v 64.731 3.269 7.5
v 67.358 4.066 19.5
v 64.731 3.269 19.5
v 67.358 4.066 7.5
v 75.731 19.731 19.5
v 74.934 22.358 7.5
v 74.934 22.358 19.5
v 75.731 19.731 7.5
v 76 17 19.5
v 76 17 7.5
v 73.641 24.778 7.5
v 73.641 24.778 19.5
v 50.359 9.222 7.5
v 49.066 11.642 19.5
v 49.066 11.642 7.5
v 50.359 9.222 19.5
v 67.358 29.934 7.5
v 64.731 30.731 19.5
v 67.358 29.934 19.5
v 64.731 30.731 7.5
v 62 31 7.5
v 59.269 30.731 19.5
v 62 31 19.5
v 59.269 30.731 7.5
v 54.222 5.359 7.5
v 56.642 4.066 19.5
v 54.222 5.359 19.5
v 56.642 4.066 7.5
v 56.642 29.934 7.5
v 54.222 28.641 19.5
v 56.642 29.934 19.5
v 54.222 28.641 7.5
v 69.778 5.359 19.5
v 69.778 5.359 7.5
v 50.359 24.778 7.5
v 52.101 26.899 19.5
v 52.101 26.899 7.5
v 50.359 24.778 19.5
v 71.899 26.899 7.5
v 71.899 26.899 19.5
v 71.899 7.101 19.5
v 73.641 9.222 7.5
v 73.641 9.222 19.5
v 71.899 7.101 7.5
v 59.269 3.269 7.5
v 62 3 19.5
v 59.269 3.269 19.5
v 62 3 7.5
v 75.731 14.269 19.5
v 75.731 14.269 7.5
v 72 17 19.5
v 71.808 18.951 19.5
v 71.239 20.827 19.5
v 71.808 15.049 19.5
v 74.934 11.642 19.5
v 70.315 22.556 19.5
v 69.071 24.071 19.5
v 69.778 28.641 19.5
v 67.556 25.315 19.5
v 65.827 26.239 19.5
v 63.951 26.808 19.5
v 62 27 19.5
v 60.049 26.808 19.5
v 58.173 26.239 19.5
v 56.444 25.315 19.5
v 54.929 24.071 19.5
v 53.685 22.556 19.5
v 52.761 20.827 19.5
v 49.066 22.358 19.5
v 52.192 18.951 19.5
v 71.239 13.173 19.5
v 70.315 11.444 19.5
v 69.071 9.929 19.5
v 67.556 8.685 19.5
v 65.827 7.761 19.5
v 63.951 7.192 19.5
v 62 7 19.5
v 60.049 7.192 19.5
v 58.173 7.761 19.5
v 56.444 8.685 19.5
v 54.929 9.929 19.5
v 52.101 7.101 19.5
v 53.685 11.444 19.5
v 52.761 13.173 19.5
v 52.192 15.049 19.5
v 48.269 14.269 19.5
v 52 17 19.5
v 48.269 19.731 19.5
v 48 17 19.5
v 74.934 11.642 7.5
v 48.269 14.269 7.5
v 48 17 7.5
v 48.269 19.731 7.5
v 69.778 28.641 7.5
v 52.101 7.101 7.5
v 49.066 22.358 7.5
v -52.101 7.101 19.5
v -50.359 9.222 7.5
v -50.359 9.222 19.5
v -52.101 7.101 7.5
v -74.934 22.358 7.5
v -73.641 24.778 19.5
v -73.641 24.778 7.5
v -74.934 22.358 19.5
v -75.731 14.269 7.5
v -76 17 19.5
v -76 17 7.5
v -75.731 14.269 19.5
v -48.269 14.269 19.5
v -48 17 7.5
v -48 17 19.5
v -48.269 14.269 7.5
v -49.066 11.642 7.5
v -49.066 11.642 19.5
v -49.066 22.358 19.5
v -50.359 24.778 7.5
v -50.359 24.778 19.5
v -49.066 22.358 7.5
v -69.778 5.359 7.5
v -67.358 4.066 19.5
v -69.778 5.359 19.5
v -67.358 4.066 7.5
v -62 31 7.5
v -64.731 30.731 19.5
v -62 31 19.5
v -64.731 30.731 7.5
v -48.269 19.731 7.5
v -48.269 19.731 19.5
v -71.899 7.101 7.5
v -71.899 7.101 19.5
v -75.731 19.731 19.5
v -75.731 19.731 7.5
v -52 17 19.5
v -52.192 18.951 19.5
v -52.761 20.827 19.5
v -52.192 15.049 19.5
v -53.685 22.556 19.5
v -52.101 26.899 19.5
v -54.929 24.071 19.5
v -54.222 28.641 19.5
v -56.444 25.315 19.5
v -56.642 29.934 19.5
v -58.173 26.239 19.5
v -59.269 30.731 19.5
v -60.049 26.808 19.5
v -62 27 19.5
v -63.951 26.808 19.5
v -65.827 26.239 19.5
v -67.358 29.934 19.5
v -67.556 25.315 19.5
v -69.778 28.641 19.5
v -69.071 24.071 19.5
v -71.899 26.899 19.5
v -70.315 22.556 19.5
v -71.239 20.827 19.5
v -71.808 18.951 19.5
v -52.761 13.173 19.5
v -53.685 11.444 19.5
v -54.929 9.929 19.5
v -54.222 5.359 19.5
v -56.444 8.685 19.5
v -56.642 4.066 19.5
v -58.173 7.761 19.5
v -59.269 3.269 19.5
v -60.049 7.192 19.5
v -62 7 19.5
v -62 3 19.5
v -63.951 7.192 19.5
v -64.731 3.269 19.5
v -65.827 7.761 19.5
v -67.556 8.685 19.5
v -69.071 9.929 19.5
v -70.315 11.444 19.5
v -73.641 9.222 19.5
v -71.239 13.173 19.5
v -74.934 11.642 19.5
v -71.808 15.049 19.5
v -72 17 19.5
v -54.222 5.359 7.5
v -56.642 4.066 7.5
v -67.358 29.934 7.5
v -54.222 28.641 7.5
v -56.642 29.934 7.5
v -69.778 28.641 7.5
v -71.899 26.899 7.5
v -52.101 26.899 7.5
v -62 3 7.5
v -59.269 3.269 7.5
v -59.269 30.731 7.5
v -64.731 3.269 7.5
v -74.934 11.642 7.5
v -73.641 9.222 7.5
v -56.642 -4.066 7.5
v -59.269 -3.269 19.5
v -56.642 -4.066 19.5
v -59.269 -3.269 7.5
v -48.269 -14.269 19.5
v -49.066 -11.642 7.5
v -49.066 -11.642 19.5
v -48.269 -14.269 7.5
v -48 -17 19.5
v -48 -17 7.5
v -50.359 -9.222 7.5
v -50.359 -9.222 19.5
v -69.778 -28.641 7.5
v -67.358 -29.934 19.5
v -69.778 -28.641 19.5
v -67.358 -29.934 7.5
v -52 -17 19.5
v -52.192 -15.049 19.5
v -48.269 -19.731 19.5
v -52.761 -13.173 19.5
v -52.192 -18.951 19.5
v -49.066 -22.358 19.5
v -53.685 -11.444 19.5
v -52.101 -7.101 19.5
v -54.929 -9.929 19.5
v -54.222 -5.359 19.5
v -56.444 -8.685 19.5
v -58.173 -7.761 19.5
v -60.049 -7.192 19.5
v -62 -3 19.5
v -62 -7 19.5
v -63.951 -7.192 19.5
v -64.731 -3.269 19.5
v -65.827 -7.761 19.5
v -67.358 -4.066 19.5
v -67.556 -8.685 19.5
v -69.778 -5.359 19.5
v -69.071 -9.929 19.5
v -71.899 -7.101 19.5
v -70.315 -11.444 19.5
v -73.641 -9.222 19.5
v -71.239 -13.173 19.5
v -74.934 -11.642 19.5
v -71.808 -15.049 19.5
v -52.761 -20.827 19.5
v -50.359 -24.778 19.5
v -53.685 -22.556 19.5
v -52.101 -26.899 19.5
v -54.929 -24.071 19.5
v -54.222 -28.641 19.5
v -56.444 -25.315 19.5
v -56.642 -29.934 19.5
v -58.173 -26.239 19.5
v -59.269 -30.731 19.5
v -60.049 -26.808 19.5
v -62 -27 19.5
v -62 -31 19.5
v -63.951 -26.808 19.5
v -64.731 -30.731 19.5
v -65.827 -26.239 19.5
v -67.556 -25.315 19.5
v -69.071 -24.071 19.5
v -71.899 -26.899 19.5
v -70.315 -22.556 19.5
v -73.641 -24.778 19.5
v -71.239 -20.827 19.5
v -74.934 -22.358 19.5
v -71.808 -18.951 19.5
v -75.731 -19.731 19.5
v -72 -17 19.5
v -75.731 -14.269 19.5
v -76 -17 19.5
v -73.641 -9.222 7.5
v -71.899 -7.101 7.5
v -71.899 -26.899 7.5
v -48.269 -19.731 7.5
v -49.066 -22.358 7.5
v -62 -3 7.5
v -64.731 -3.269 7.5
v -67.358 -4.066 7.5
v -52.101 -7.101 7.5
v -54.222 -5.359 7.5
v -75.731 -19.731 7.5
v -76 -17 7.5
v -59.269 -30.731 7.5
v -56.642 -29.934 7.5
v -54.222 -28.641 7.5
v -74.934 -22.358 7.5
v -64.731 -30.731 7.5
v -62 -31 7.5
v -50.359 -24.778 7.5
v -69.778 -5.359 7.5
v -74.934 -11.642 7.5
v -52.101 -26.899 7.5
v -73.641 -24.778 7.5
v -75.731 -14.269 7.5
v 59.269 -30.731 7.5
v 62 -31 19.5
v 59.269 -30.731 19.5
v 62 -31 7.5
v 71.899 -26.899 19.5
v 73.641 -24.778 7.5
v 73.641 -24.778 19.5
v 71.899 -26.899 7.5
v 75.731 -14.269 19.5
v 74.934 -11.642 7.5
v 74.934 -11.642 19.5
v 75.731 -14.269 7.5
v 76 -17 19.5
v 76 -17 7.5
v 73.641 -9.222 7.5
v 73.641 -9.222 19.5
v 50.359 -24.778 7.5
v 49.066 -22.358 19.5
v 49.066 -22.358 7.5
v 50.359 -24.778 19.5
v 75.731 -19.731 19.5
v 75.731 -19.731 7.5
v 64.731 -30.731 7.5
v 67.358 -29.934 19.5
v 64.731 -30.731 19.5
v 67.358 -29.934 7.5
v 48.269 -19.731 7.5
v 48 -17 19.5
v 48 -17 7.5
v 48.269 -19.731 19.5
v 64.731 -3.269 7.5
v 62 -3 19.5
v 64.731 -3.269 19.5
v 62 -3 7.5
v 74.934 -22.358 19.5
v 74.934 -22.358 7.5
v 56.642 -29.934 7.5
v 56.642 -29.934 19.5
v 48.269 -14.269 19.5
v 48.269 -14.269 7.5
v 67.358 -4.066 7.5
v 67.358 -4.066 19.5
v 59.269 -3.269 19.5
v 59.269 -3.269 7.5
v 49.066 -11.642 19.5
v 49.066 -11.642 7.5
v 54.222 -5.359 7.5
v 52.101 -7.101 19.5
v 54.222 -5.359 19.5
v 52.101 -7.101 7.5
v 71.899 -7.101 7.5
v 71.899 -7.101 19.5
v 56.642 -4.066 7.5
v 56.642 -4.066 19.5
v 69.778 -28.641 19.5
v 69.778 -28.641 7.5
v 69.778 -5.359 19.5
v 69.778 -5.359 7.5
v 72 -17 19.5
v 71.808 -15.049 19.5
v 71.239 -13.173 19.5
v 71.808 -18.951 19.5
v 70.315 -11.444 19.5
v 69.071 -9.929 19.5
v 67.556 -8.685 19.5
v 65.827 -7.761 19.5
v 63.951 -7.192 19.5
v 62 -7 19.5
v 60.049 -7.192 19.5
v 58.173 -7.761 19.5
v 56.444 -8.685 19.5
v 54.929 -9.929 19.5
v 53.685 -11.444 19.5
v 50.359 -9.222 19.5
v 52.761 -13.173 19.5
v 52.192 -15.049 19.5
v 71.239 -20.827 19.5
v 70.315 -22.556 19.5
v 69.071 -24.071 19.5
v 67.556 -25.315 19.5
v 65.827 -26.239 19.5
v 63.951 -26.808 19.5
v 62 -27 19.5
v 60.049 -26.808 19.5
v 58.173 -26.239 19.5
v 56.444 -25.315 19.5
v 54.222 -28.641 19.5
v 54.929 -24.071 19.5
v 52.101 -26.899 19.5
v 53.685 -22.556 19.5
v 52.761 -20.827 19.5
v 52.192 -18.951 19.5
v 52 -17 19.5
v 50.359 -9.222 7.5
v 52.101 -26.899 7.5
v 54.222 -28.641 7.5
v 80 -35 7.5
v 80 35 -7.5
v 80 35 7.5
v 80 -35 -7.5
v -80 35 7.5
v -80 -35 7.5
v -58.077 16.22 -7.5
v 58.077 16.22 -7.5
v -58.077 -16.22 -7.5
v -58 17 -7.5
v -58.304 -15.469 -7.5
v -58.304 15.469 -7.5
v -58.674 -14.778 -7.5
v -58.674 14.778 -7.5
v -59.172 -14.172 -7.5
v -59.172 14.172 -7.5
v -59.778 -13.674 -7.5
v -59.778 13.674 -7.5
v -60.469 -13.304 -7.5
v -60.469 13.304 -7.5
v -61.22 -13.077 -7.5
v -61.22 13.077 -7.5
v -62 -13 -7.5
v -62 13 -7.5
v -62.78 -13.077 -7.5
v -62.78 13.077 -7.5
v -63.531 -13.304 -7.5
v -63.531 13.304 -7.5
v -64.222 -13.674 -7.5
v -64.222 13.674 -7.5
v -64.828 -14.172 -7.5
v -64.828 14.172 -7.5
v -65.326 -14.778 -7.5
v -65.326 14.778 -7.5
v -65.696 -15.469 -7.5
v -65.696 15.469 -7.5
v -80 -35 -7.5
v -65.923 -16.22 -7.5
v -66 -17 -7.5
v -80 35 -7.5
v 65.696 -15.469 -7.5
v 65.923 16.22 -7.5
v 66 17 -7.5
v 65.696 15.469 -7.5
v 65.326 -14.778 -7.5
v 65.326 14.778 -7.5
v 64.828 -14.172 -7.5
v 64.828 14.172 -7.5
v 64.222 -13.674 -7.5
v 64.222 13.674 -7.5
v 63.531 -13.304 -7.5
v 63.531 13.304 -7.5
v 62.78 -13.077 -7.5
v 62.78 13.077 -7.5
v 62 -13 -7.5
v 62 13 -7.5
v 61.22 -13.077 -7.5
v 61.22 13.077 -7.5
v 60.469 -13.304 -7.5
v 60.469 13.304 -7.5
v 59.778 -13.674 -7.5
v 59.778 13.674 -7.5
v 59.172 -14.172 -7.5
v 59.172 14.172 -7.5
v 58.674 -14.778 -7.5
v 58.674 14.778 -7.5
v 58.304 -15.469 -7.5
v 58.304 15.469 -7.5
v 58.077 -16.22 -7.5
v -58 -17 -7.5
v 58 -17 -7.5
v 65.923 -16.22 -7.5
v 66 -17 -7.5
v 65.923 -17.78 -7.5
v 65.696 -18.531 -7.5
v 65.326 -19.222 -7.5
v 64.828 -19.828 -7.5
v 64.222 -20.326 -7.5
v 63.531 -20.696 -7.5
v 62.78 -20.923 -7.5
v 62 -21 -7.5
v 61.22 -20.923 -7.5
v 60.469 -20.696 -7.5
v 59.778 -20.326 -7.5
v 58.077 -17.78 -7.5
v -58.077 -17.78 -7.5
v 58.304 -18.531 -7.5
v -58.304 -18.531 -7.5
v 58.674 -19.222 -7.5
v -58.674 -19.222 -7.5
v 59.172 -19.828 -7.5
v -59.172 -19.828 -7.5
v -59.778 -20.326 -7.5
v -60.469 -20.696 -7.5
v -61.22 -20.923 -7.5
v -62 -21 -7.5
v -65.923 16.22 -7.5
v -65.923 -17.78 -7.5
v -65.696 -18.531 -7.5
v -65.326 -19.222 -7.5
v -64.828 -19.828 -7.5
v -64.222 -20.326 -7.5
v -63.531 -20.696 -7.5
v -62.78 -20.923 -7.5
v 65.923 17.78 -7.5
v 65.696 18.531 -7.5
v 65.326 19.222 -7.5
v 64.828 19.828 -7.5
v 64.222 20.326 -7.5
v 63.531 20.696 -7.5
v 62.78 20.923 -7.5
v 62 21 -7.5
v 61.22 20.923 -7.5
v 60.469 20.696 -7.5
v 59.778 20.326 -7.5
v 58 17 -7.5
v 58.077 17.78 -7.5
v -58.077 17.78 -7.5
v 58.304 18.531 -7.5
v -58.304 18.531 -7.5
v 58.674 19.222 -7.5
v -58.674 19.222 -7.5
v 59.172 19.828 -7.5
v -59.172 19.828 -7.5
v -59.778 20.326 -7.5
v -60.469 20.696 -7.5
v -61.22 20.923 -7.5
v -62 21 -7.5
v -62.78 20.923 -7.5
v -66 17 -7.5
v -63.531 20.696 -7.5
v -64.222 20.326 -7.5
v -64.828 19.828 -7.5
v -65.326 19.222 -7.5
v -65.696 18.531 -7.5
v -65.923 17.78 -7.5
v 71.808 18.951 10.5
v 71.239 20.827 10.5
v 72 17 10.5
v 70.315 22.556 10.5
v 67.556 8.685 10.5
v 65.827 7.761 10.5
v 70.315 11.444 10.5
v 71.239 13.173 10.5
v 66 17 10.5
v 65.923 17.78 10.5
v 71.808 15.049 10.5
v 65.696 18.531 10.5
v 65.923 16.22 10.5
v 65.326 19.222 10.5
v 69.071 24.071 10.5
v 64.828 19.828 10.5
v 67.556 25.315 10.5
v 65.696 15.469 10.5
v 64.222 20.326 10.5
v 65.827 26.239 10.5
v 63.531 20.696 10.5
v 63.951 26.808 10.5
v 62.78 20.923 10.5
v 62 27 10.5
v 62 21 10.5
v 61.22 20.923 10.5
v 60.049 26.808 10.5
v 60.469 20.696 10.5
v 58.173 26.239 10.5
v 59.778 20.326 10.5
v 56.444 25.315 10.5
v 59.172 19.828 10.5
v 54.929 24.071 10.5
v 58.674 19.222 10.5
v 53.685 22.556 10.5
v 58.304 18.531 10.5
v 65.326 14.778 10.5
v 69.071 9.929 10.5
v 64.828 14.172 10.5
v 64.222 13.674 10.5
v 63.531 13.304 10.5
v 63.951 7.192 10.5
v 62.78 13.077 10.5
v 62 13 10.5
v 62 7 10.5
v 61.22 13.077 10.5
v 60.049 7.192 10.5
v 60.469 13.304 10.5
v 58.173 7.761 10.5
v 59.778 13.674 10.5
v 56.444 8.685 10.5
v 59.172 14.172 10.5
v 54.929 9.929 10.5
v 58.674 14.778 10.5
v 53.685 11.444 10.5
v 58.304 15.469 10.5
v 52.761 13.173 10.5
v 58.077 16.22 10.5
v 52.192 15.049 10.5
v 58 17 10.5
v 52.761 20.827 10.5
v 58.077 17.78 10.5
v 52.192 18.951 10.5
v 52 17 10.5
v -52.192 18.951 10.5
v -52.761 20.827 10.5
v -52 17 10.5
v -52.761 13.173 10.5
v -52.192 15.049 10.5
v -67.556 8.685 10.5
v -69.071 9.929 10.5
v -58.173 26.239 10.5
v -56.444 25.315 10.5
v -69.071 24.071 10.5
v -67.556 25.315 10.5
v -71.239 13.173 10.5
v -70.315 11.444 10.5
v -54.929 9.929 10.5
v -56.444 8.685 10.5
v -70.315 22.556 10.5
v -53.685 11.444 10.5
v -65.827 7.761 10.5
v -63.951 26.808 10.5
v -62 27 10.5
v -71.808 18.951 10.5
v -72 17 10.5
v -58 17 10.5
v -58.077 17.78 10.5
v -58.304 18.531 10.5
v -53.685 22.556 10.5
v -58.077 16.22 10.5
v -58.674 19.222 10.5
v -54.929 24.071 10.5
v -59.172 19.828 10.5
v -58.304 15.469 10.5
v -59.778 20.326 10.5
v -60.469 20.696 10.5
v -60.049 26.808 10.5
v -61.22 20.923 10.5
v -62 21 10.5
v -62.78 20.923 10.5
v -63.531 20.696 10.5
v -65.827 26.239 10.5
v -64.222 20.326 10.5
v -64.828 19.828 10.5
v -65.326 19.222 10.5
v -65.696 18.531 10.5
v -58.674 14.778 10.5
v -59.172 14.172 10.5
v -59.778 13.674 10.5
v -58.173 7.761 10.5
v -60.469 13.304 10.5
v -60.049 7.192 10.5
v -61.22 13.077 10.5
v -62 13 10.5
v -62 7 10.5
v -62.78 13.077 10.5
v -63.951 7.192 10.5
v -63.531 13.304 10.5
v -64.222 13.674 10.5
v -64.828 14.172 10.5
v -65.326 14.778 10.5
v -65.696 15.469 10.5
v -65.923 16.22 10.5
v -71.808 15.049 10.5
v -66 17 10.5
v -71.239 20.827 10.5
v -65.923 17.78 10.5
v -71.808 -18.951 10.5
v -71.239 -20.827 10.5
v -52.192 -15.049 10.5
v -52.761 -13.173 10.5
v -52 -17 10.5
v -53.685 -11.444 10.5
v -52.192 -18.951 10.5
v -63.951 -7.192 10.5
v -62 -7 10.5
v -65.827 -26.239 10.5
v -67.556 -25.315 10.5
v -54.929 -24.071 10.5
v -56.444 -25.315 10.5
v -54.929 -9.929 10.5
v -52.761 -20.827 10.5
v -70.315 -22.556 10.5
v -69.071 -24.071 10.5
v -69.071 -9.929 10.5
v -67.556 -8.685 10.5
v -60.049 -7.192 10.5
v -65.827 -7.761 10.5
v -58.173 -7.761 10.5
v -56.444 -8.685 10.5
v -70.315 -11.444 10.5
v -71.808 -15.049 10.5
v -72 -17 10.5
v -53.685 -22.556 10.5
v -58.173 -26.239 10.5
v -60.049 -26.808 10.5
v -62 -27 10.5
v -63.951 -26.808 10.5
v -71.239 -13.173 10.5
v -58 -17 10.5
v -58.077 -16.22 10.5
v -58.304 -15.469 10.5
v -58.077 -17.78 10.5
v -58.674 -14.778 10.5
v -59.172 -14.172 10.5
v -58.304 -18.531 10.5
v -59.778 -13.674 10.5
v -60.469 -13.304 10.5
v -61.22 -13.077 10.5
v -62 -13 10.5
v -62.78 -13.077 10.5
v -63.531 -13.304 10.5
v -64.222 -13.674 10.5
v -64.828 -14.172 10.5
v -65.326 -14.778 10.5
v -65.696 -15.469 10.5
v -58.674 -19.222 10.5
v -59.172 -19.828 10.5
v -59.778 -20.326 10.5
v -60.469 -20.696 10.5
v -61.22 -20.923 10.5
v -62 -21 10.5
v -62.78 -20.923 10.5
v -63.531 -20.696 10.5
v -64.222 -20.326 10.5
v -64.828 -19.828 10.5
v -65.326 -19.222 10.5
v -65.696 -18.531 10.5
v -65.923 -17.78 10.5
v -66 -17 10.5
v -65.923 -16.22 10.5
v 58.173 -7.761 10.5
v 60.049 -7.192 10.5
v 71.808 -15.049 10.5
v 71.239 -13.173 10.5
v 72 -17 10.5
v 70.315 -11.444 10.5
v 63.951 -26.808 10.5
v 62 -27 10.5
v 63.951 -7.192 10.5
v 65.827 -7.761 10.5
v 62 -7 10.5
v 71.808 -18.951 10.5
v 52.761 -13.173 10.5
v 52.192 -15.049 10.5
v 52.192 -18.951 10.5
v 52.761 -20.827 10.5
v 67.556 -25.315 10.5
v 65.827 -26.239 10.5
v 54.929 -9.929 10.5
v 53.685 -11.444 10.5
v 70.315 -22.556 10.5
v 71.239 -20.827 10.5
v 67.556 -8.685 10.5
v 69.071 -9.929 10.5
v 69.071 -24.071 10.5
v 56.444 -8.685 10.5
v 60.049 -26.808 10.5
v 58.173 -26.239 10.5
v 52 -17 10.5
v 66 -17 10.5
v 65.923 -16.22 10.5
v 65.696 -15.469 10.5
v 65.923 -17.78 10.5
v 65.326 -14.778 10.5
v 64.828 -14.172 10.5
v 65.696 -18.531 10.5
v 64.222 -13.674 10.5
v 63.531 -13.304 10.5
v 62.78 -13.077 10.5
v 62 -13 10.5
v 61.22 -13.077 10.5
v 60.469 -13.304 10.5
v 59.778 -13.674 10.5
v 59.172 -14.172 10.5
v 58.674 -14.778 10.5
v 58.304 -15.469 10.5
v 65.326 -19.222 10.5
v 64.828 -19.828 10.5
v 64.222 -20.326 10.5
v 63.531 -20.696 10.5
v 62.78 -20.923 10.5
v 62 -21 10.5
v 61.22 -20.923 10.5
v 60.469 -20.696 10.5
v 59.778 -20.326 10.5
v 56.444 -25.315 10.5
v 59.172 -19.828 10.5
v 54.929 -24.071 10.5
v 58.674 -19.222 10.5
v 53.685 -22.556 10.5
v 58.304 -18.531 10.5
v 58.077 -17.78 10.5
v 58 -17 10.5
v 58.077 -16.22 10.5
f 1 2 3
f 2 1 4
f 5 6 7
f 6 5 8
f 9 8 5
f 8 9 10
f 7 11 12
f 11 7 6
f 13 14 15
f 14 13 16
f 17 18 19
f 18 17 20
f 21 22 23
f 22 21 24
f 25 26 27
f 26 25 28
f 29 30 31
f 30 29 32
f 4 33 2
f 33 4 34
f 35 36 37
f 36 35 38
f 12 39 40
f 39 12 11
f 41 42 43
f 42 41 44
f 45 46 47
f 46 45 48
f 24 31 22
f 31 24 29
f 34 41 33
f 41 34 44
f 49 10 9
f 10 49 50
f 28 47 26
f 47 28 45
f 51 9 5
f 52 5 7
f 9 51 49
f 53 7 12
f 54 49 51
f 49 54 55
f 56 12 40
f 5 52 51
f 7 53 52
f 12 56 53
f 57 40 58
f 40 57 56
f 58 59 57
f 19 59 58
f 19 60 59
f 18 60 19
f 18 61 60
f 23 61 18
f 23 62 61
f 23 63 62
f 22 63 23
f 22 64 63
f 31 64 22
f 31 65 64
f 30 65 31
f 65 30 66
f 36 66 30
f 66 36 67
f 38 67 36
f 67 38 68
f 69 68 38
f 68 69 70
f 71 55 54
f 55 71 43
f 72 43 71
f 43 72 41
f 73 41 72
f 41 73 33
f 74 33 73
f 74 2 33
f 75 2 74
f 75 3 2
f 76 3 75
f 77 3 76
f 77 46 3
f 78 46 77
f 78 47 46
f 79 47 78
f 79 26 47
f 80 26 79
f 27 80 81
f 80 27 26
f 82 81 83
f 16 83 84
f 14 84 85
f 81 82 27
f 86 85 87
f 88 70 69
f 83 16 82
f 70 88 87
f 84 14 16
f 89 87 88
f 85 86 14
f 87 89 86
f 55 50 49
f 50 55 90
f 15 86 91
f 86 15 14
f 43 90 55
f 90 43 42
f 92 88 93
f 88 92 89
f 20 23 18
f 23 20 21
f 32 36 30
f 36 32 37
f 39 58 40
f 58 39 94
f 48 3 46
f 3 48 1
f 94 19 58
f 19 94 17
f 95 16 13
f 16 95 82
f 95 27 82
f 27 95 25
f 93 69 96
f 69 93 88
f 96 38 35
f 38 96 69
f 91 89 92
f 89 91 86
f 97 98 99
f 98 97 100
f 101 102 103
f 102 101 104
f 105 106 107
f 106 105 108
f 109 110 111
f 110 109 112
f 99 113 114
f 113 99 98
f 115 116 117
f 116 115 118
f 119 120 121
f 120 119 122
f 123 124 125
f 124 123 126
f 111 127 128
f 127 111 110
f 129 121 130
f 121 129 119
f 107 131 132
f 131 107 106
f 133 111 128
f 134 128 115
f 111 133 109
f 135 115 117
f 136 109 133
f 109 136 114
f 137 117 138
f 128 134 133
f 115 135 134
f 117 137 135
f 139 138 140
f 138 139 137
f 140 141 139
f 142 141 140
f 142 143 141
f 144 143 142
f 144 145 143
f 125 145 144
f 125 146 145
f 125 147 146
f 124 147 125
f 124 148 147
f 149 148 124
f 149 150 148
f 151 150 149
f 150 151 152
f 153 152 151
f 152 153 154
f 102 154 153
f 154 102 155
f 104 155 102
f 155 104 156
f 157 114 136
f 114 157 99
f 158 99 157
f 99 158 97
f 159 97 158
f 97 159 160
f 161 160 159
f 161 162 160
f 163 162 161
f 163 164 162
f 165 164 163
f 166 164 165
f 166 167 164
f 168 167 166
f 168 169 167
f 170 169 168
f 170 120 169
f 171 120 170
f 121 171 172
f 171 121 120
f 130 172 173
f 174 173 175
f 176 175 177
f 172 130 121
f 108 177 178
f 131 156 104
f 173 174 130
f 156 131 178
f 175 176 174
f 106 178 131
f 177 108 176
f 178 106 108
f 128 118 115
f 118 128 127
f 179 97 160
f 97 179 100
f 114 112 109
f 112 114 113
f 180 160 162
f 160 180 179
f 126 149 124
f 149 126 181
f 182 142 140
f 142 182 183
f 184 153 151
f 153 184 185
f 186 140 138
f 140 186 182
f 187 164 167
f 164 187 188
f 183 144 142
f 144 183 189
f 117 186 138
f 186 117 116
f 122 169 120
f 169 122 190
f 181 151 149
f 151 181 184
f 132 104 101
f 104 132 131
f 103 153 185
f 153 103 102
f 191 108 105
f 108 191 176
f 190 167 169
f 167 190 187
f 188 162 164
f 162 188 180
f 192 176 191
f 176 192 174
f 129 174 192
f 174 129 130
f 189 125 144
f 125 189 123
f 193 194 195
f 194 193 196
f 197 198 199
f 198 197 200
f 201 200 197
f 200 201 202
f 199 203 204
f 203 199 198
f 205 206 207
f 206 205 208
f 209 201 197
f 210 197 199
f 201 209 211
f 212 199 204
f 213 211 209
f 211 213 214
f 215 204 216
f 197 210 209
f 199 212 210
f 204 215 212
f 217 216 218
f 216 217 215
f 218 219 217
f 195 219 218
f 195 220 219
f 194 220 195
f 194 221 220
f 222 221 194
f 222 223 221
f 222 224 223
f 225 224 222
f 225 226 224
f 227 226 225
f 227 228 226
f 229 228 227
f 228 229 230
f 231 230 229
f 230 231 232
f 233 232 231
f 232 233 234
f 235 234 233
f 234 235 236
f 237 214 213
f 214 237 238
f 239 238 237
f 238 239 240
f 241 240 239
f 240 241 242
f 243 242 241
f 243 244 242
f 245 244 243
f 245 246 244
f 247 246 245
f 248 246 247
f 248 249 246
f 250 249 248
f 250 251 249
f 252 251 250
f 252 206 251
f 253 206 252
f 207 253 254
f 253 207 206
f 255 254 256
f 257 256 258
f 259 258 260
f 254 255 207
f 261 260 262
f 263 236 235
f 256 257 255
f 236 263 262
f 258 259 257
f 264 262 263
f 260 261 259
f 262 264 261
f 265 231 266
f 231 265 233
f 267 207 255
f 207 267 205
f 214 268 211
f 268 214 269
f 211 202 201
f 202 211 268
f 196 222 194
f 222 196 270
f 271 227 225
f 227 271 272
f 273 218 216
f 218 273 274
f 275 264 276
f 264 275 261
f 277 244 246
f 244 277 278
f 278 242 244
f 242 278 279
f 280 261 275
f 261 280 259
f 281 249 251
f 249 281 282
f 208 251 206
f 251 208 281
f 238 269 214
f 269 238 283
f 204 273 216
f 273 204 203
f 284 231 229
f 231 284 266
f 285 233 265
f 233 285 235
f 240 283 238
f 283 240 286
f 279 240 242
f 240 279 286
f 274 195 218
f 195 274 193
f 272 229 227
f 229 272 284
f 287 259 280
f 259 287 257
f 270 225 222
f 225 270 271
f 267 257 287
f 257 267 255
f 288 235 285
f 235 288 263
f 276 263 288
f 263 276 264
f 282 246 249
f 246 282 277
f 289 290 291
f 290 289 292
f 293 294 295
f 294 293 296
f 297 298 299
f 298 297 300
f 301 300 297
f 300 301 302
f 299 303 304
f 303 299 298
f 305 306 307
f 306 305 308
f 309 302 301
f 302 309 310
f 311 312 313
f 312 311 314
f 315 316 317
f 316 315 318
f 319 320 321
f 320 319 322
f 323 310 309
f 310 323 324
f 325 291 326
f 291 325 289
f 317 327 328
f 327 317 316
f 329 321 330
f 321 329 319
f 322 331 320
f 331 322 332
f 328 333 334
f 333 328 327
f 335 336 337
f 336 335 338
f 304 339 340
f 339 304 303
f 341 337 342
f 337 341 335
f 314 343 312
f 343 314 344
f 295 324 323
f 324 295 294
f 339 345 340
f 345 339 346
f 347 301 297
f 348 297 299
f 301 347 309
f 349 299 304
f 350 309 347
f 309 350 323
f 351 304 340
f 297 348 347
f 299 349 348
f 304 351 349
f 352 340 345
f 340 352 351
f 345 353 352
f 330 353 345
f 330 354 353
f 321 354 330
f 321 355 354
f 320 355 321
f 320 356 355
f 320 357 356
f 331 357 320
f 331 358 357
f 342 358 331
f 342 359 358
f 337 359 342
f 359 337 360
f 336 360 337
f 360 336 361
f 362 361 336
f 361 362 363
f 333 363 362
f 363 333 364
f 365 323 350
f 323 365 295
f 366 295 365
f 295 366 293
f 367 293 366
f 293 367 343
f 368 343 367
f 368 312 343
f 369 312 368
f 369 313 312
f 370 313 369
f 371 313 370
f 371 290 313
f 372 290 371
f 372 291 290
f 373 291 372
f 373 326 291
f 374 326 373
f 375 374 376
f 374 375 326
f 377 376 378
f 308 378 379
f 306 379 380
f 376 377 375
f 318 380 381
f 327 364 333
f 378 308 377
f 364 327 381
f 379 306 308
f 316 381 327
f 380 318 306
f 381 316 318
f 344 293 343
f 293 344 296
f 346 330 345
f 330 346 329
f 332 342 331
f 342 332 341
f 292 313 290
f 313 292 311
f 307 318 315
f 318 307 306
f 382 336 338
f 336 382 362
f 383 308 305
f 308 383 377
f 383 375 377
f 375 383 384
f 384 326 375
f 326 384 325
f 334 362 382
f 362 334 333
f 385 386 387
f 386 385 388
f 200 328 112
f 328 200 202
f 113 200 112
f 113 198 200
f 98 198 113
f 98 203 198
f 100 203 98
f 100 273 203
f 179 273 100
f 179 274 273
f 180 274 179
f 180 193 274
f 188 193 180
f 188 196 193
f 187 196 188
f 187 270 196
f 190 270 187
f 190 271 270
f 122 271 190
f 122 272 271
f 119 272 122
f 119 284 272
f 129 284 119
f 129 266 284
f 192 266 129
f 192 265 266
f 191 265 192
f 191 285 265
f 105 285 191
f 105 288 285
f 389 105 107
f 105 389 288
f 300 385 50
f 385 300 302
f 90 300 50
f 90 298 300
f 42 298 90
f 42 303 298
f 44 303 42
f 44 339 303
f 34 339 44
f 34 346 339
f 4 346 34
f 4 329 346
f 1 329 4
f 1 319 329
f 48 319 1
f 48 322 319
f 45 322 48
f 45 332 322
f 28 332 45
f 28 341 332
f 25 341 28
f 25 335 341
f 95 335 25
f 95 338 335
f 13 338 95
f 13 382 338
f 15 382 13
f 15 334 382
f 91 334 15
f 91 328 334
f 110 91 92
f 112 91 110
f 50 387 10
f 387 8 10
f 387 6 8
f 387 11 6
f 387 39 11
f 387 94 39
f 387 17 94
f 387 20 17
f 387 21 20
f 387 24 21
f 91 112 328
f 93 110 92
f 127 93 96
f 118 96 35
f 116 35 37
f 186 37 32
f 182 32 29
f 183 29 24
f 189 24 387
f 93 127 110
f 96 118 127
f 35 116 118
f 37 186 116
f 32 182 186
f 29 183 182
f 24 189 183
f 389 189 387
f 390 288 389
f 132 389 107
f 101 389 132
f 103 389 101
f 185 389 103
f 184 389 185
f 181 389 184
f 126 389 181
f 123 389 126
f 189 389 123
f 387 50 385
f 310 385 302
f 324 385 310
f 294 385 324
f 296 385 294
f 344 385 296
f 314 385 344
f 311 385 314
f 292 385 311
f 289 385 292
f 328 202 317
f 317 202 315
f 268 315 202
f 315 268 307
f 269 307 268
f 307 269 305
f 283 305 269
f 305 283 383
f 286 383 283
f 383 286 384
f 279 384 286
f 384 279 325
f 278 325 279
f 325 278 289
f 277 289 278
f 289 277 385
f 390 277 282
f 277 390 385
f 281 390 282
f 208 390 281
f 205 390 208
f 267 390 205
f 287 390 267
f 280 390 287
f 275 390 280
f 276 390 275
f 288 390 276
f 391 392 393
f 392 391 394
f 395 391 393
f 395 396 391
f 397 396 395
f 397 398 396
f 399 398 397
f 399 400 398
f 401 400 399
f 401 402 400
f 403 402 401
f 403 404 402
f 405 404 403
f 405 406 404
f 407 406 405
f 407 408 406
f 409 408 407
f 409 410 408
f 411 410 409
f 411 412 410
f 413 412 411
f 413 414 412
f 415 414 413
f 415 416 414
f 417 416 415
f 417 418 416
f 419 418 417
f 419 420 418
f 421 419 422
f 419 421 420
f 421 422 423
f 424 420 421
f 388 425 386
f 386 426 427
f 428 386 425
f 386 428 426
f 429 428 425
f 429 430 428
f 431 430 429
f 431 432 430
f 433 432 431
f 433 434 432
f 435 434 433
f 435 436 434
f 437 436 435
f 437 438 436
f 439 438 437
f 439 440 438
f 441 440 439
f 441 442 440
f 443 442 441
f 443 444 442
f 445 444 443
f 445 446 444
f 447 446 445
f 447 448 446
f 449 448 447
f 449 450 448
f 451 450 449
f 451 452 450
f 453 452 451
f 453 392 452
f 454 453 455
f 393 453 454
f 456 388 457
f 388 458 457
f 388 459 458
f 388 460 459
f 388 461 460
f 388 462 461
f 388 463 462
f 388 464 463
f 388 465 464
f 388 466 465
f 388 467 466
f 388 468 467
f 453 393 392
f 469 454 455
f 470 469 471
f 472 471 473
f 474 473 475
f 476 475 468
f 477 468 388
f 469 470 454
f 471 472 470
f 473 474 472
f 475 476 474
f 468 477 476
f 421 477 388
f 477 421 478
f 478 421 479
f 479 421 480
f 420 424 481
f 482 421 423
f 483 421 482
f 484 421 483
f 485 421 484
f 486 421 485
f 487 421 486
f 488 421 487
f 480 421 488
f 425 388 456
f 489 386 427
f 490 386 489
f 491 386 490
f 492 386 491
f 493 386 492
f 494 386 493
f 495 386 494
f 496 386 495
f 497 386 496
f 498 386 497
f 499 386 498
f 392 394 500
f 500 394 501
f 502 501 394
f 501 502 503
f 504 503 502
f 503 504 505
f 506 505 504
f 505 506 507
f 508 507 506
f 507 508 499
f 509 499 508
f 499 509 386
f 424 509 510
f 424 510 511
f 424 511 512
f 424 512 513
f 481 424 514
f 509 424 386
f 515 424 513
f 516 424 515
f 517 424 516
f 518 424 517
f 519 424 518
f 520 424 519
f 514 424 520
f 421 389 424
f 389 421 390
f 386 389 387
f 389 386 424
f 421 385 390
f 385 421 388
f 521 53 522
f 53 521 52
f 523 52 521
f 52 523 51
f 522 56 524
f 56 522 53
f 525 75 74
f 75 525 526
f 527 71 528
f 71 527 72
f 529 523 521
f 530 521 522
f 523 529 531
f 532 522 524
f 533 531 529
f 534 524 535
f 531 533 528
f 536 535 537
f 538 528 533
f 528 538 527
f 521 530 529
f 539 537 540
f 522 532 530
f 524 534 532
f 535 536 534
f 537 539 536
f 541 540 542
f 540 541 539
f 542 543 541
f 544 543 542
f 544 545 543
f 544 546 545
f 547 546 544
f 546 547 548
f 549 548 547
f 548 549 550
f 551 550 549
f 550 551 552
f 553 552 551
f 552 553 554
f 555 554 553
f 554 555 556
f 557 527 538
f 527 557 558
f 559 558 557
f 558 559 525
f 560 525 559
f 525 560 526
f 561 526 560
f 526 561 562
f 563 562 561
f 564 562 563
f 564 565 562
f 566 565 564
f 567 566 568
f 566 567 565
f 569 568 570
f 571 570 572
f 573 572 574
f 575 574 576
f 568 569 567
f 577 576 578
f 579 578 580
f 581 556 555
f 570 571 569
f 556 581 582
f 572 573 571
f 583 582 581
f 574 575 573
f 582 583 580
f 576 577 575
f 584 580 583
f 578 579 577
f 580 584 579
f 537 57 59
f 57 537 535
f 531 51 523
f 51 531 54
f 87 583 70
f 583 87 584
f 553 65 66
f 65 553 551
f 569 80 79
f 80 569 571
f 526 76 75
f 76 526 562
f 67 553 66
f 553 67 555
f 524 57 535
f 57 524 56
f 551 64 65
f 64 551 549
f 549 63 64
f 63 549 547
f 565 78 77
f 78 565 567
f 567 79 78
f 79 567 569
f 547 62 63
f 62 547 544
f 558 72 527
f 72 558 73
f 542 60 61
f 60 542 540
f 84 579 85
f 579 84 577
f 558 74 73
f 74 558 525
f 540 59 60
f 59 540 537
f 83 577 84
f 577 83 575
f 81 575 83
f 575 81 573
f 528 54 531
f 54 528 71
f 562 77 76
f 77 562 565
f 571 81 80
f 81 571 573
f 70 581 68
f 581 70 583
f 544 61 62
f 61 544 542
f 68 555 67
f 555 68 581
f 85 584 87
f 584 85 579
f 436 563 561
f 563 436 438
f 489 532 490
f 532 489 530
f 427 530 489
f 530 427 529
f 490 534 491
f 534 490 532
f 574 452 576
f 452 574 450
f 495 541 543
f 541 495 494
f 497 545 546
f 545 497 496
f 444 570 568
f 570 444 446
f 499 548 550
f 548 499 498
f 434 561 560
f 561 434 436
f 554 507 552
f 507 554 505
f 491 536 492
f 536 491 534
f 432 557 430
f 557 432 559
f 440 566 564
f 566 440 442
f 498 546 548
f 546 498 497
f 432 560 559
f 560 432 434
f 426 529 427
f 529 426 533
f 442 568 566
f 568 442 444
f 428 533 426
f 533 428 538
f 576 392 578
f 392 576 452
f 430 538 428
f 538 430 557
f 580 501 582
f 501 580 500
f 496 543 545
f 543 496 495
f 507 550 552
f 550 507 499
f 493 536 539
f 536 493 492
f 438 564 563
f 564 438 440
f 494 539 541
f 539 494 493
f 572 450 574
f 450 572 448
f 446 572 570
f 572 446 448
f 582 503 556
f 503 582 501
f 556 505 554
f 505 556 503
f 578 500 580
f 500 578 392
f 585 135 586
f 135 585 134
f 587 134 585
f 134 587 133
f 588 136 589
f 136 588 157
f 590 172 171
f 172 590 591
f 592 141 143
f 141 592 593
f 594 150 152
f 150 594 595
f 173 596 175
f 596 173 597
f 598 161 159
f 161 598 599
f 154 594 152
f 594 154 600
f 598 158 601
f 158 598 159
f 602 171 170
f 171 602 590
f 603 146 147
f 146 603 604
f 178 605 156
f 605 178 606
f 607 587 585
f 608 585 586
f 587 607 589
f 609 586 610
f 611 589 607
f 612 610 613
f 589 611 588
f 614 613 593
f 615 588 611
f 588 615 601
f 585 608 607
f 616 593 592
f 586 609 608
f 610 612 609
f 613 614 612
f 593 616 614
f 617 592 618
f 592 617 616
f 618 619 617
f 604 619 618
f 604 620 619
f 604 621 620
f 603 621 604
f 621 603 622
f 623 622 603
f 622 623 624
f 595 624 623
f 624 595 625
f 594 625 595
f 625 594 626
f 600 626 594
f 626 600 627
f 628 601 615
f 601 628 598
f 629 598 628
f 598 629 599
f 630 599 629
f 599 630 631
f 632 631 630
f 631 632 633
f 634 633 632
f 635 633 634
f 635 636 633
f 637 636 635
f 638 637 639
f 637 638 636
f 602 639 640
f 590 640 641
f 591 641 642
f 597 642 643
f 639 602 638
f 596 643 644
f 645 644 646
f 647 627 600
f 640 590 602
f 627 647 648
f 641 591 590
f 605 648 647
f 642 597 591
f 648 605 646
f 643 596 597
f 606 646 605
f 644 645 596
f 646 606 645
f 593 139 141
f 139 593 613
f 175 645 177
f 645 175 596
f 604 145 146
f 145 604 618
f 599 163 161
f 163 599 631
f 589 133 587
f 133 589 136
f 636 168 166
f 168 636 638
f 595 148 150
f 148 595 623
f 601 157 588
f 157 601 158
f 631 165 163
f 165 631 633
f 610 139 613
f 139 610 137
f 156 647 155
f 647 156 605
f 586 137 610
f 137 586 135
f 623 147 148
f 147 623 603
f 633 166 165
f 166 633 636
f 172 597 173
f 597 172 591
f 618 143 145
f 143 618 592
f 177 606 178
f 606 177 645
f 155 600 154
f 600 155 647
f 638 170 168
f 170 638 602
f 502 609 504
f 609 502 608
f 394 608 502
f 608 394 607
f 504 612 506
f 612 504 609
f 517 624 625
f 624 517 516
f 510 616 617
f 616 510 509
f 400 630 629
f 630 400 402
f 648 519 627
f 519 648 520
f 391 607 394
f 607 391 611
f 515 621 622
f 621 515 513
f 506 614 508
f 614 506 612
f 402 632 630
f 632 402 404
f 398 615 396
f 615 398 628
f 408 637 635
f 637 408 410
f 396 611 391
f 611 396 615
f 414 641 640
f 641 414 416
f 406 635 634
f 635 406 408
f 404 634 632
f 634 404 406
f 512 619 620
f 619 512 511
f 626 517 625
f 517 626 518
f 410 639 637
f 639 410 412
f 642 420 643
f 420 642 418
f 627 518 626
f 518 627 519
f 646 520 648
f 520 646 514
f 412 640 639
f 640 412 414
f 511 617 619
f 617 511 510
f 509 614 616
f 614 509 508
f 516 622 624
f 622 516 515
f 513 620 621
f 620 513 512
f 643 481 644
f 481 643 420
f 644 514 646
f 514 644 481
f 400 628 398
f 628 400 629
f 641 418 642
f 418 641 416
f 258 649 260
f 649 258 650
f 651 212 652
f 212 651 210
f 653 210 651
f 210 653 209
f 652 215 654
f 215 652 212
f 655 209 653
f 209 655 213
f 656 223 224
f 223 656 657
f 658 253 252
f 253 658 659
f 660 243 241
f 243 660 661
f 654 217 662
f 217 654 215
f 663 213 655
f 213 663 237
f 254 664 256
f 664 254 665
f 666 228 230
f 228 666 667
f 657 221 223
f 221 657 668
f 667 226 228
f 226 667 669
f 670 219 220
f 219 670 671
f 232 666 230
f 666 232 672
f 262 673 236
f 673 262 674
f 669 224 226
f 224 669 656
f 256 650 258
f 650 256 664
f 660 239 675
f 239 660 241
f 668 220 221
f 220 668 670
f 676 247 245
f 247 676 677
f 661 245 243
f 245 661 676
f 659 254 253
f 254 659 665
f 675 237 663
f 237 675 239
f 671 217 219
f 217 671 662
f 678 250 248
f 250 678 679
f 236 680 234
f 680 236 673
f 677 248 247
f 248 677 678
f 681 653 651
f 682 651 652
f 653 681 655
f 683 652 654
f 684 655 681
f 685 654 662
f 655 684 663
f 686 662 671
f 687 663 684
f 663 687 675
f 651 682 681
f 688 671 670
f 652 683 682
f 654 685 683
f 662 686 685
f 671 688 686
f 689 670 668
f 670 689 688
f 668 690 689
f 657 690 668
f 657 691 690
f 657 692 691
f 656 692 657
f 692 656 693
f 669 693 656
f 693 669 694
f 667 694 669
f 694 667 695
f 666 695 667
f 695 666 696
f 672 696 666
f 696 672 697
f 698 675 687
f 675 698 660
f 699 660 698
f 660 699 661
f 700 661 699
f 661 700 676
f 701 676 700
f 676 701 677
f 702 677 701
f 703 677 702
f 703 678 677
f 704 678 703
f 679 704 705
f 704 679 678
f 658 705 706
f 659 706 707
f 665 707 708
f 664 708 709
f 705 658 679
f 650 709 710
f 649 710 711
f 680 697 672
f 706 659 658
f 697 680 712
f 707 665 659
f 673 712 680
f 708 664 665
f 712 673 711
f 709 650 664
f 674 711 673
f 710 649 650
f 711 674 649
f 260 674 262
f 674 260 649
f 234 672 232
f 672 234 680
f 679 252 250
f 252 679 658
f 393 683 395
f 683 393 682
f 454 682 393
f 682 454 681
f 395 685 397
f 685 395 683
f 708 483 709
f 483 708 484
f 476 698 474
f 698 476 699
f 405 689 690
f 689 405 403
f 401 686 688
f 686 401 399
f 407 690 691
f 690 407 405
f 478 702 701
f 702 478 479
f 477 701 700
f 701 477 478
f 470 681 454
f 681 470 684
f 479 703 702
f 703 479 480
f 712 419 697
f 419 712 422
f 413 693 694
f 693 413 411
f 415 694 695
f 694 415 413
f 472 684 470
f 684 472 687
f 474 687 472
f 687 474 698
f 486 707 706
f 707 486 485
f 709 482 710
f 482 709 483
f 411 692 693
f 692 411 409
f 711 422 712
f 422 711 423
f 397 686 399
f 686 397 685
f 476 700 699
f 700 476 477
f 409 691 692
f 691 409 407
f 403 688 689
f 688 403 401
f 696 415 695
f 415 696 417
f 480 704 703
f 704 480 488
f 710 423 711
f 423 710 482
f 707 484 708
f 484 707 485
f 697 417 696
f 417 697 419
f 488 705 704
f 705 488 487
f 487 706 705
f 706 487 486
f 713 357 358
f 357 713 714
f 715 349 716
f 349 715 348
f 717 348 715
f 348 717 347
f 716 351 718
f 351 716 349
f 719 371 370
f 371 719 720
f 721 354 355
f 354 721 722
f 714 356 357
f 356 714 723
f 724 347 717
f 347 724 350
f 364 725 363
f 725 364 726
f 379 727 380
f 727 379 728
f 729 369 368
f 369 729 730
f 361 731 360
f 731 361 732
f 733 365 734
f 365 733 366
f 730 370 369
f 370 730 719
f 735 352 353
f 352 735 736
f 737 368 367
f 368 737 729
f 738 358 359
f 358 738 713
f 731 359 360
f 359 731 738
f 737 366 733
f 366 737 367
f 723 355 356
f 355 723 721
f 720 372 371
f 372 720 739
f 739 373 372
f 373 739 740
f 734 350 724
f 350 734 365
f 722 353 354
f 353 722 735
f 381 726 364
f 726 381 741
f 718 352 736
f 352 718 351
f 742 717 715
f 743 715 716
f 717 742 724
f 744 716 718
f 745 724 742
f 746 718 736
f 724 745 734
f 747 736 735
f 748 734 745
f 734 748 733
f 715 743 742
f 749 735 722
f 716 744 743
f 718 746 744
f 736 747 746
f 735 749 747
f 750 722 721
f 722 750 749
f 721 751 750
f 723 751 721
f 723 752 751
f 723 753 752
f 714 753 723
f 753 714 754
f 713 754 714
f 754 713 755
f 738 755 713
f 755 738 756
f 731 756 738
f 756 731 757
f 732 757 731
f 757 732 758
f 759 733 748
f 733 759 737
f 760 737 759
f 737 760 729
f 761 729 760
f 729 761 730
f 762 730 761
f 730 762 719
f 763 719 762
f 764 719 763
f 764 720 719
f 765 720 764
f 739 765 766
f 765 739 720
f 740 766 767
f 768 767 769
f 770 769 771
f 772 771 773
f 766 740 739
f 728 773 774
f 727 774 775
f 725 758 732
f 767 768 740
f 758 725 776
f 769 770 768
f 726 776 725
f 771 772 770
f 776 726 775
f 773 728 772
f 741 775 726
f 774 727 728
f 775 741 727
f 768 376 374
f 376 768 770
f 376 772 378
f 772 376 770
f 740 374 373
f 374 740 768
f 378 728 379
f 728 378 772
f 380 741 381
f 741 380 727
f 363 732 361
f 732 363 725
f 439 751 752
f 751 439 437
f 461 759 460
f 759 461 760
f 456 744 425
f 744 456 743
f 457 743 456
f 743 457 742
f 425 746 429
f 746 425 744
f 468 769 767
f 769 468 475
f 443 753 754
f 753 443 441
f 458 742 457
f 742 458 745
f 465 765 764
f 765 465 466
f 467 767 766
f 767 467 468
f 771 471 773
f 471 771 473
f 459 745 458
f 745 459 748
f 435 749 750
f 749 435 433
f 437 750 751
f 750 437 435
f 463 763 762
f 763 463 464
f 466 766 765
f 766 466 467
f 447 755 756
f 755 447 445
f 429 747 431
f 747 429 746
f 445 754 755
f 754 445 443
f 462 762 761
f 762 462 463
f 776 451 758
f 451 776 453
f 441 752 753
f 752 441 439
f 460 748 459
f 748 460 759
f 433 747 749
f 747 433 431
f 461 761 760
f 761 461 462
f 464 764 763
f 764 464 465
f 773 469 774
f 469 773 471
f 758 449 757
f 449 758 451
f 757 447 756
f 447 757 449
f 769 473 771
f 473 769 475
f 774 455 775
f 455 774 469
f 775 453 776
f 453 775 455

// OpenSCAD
$fn = 32;

// ----------------------------------------------------------------------
// Socket pad plate
// bosses with counterbored sockets for the screws
// ----------------------------------------------------------------------

// --- parameters (mm) ---
base_t = 15;            // base plate thickness
boss_h = 12;            // boss height above the base plate
boss_d = 28;            // boss diameter
socket_d = 20;          // socket diameter
socket_depth = 9;       // socket depth from the boss face
bolt_d = 8;             // screw clearance hole through the socket floor
plate = [160, 70, 15];  // overall size (x, y, z)
edge = 18;              // boss centre offset from the plate edge
pads = 4;               // boss count, one per corner

// --- derived feature positions (mm) ---
height = base_t + boss_h;        // = 27   overall height of the part
corner_x = plate[0] / 2 - edge;  // = 62   boss centre X
corner_y = plate[1] / 2 - edge;  // = 17   boss centre Y
feature_centers = [
  [corner_x, corner_y],
  [-corner_x, corner_y],
  [-corner_x, -corner_y],
  [corner_x, -corner_y]
];   // boss centres: sockets, holes and the pads themselves are placed from here

// base plate, bosses on feature_centers, socket + through hole in each
difference() {
  union() {
    cube(plate, center = true);
    for (centre = feature_centers)
      translate([centre[0], centre[1], plate[2] / 2 - 1])
        cylinder(d = boss_d, h = boss_h + 1);
  }
  for (centre = feature_centers) {
    translate([centre[0], centre[1], plate[2] / 2 + boss_h - socket_depth])
      cylinder(d = socket_d, h = socket_depth + 1);
    translate([centre[0], centre[1], -height])
      cylinder(d = bolt_d, h = 2 * height + 2);  // through the socket floor
  }
}
